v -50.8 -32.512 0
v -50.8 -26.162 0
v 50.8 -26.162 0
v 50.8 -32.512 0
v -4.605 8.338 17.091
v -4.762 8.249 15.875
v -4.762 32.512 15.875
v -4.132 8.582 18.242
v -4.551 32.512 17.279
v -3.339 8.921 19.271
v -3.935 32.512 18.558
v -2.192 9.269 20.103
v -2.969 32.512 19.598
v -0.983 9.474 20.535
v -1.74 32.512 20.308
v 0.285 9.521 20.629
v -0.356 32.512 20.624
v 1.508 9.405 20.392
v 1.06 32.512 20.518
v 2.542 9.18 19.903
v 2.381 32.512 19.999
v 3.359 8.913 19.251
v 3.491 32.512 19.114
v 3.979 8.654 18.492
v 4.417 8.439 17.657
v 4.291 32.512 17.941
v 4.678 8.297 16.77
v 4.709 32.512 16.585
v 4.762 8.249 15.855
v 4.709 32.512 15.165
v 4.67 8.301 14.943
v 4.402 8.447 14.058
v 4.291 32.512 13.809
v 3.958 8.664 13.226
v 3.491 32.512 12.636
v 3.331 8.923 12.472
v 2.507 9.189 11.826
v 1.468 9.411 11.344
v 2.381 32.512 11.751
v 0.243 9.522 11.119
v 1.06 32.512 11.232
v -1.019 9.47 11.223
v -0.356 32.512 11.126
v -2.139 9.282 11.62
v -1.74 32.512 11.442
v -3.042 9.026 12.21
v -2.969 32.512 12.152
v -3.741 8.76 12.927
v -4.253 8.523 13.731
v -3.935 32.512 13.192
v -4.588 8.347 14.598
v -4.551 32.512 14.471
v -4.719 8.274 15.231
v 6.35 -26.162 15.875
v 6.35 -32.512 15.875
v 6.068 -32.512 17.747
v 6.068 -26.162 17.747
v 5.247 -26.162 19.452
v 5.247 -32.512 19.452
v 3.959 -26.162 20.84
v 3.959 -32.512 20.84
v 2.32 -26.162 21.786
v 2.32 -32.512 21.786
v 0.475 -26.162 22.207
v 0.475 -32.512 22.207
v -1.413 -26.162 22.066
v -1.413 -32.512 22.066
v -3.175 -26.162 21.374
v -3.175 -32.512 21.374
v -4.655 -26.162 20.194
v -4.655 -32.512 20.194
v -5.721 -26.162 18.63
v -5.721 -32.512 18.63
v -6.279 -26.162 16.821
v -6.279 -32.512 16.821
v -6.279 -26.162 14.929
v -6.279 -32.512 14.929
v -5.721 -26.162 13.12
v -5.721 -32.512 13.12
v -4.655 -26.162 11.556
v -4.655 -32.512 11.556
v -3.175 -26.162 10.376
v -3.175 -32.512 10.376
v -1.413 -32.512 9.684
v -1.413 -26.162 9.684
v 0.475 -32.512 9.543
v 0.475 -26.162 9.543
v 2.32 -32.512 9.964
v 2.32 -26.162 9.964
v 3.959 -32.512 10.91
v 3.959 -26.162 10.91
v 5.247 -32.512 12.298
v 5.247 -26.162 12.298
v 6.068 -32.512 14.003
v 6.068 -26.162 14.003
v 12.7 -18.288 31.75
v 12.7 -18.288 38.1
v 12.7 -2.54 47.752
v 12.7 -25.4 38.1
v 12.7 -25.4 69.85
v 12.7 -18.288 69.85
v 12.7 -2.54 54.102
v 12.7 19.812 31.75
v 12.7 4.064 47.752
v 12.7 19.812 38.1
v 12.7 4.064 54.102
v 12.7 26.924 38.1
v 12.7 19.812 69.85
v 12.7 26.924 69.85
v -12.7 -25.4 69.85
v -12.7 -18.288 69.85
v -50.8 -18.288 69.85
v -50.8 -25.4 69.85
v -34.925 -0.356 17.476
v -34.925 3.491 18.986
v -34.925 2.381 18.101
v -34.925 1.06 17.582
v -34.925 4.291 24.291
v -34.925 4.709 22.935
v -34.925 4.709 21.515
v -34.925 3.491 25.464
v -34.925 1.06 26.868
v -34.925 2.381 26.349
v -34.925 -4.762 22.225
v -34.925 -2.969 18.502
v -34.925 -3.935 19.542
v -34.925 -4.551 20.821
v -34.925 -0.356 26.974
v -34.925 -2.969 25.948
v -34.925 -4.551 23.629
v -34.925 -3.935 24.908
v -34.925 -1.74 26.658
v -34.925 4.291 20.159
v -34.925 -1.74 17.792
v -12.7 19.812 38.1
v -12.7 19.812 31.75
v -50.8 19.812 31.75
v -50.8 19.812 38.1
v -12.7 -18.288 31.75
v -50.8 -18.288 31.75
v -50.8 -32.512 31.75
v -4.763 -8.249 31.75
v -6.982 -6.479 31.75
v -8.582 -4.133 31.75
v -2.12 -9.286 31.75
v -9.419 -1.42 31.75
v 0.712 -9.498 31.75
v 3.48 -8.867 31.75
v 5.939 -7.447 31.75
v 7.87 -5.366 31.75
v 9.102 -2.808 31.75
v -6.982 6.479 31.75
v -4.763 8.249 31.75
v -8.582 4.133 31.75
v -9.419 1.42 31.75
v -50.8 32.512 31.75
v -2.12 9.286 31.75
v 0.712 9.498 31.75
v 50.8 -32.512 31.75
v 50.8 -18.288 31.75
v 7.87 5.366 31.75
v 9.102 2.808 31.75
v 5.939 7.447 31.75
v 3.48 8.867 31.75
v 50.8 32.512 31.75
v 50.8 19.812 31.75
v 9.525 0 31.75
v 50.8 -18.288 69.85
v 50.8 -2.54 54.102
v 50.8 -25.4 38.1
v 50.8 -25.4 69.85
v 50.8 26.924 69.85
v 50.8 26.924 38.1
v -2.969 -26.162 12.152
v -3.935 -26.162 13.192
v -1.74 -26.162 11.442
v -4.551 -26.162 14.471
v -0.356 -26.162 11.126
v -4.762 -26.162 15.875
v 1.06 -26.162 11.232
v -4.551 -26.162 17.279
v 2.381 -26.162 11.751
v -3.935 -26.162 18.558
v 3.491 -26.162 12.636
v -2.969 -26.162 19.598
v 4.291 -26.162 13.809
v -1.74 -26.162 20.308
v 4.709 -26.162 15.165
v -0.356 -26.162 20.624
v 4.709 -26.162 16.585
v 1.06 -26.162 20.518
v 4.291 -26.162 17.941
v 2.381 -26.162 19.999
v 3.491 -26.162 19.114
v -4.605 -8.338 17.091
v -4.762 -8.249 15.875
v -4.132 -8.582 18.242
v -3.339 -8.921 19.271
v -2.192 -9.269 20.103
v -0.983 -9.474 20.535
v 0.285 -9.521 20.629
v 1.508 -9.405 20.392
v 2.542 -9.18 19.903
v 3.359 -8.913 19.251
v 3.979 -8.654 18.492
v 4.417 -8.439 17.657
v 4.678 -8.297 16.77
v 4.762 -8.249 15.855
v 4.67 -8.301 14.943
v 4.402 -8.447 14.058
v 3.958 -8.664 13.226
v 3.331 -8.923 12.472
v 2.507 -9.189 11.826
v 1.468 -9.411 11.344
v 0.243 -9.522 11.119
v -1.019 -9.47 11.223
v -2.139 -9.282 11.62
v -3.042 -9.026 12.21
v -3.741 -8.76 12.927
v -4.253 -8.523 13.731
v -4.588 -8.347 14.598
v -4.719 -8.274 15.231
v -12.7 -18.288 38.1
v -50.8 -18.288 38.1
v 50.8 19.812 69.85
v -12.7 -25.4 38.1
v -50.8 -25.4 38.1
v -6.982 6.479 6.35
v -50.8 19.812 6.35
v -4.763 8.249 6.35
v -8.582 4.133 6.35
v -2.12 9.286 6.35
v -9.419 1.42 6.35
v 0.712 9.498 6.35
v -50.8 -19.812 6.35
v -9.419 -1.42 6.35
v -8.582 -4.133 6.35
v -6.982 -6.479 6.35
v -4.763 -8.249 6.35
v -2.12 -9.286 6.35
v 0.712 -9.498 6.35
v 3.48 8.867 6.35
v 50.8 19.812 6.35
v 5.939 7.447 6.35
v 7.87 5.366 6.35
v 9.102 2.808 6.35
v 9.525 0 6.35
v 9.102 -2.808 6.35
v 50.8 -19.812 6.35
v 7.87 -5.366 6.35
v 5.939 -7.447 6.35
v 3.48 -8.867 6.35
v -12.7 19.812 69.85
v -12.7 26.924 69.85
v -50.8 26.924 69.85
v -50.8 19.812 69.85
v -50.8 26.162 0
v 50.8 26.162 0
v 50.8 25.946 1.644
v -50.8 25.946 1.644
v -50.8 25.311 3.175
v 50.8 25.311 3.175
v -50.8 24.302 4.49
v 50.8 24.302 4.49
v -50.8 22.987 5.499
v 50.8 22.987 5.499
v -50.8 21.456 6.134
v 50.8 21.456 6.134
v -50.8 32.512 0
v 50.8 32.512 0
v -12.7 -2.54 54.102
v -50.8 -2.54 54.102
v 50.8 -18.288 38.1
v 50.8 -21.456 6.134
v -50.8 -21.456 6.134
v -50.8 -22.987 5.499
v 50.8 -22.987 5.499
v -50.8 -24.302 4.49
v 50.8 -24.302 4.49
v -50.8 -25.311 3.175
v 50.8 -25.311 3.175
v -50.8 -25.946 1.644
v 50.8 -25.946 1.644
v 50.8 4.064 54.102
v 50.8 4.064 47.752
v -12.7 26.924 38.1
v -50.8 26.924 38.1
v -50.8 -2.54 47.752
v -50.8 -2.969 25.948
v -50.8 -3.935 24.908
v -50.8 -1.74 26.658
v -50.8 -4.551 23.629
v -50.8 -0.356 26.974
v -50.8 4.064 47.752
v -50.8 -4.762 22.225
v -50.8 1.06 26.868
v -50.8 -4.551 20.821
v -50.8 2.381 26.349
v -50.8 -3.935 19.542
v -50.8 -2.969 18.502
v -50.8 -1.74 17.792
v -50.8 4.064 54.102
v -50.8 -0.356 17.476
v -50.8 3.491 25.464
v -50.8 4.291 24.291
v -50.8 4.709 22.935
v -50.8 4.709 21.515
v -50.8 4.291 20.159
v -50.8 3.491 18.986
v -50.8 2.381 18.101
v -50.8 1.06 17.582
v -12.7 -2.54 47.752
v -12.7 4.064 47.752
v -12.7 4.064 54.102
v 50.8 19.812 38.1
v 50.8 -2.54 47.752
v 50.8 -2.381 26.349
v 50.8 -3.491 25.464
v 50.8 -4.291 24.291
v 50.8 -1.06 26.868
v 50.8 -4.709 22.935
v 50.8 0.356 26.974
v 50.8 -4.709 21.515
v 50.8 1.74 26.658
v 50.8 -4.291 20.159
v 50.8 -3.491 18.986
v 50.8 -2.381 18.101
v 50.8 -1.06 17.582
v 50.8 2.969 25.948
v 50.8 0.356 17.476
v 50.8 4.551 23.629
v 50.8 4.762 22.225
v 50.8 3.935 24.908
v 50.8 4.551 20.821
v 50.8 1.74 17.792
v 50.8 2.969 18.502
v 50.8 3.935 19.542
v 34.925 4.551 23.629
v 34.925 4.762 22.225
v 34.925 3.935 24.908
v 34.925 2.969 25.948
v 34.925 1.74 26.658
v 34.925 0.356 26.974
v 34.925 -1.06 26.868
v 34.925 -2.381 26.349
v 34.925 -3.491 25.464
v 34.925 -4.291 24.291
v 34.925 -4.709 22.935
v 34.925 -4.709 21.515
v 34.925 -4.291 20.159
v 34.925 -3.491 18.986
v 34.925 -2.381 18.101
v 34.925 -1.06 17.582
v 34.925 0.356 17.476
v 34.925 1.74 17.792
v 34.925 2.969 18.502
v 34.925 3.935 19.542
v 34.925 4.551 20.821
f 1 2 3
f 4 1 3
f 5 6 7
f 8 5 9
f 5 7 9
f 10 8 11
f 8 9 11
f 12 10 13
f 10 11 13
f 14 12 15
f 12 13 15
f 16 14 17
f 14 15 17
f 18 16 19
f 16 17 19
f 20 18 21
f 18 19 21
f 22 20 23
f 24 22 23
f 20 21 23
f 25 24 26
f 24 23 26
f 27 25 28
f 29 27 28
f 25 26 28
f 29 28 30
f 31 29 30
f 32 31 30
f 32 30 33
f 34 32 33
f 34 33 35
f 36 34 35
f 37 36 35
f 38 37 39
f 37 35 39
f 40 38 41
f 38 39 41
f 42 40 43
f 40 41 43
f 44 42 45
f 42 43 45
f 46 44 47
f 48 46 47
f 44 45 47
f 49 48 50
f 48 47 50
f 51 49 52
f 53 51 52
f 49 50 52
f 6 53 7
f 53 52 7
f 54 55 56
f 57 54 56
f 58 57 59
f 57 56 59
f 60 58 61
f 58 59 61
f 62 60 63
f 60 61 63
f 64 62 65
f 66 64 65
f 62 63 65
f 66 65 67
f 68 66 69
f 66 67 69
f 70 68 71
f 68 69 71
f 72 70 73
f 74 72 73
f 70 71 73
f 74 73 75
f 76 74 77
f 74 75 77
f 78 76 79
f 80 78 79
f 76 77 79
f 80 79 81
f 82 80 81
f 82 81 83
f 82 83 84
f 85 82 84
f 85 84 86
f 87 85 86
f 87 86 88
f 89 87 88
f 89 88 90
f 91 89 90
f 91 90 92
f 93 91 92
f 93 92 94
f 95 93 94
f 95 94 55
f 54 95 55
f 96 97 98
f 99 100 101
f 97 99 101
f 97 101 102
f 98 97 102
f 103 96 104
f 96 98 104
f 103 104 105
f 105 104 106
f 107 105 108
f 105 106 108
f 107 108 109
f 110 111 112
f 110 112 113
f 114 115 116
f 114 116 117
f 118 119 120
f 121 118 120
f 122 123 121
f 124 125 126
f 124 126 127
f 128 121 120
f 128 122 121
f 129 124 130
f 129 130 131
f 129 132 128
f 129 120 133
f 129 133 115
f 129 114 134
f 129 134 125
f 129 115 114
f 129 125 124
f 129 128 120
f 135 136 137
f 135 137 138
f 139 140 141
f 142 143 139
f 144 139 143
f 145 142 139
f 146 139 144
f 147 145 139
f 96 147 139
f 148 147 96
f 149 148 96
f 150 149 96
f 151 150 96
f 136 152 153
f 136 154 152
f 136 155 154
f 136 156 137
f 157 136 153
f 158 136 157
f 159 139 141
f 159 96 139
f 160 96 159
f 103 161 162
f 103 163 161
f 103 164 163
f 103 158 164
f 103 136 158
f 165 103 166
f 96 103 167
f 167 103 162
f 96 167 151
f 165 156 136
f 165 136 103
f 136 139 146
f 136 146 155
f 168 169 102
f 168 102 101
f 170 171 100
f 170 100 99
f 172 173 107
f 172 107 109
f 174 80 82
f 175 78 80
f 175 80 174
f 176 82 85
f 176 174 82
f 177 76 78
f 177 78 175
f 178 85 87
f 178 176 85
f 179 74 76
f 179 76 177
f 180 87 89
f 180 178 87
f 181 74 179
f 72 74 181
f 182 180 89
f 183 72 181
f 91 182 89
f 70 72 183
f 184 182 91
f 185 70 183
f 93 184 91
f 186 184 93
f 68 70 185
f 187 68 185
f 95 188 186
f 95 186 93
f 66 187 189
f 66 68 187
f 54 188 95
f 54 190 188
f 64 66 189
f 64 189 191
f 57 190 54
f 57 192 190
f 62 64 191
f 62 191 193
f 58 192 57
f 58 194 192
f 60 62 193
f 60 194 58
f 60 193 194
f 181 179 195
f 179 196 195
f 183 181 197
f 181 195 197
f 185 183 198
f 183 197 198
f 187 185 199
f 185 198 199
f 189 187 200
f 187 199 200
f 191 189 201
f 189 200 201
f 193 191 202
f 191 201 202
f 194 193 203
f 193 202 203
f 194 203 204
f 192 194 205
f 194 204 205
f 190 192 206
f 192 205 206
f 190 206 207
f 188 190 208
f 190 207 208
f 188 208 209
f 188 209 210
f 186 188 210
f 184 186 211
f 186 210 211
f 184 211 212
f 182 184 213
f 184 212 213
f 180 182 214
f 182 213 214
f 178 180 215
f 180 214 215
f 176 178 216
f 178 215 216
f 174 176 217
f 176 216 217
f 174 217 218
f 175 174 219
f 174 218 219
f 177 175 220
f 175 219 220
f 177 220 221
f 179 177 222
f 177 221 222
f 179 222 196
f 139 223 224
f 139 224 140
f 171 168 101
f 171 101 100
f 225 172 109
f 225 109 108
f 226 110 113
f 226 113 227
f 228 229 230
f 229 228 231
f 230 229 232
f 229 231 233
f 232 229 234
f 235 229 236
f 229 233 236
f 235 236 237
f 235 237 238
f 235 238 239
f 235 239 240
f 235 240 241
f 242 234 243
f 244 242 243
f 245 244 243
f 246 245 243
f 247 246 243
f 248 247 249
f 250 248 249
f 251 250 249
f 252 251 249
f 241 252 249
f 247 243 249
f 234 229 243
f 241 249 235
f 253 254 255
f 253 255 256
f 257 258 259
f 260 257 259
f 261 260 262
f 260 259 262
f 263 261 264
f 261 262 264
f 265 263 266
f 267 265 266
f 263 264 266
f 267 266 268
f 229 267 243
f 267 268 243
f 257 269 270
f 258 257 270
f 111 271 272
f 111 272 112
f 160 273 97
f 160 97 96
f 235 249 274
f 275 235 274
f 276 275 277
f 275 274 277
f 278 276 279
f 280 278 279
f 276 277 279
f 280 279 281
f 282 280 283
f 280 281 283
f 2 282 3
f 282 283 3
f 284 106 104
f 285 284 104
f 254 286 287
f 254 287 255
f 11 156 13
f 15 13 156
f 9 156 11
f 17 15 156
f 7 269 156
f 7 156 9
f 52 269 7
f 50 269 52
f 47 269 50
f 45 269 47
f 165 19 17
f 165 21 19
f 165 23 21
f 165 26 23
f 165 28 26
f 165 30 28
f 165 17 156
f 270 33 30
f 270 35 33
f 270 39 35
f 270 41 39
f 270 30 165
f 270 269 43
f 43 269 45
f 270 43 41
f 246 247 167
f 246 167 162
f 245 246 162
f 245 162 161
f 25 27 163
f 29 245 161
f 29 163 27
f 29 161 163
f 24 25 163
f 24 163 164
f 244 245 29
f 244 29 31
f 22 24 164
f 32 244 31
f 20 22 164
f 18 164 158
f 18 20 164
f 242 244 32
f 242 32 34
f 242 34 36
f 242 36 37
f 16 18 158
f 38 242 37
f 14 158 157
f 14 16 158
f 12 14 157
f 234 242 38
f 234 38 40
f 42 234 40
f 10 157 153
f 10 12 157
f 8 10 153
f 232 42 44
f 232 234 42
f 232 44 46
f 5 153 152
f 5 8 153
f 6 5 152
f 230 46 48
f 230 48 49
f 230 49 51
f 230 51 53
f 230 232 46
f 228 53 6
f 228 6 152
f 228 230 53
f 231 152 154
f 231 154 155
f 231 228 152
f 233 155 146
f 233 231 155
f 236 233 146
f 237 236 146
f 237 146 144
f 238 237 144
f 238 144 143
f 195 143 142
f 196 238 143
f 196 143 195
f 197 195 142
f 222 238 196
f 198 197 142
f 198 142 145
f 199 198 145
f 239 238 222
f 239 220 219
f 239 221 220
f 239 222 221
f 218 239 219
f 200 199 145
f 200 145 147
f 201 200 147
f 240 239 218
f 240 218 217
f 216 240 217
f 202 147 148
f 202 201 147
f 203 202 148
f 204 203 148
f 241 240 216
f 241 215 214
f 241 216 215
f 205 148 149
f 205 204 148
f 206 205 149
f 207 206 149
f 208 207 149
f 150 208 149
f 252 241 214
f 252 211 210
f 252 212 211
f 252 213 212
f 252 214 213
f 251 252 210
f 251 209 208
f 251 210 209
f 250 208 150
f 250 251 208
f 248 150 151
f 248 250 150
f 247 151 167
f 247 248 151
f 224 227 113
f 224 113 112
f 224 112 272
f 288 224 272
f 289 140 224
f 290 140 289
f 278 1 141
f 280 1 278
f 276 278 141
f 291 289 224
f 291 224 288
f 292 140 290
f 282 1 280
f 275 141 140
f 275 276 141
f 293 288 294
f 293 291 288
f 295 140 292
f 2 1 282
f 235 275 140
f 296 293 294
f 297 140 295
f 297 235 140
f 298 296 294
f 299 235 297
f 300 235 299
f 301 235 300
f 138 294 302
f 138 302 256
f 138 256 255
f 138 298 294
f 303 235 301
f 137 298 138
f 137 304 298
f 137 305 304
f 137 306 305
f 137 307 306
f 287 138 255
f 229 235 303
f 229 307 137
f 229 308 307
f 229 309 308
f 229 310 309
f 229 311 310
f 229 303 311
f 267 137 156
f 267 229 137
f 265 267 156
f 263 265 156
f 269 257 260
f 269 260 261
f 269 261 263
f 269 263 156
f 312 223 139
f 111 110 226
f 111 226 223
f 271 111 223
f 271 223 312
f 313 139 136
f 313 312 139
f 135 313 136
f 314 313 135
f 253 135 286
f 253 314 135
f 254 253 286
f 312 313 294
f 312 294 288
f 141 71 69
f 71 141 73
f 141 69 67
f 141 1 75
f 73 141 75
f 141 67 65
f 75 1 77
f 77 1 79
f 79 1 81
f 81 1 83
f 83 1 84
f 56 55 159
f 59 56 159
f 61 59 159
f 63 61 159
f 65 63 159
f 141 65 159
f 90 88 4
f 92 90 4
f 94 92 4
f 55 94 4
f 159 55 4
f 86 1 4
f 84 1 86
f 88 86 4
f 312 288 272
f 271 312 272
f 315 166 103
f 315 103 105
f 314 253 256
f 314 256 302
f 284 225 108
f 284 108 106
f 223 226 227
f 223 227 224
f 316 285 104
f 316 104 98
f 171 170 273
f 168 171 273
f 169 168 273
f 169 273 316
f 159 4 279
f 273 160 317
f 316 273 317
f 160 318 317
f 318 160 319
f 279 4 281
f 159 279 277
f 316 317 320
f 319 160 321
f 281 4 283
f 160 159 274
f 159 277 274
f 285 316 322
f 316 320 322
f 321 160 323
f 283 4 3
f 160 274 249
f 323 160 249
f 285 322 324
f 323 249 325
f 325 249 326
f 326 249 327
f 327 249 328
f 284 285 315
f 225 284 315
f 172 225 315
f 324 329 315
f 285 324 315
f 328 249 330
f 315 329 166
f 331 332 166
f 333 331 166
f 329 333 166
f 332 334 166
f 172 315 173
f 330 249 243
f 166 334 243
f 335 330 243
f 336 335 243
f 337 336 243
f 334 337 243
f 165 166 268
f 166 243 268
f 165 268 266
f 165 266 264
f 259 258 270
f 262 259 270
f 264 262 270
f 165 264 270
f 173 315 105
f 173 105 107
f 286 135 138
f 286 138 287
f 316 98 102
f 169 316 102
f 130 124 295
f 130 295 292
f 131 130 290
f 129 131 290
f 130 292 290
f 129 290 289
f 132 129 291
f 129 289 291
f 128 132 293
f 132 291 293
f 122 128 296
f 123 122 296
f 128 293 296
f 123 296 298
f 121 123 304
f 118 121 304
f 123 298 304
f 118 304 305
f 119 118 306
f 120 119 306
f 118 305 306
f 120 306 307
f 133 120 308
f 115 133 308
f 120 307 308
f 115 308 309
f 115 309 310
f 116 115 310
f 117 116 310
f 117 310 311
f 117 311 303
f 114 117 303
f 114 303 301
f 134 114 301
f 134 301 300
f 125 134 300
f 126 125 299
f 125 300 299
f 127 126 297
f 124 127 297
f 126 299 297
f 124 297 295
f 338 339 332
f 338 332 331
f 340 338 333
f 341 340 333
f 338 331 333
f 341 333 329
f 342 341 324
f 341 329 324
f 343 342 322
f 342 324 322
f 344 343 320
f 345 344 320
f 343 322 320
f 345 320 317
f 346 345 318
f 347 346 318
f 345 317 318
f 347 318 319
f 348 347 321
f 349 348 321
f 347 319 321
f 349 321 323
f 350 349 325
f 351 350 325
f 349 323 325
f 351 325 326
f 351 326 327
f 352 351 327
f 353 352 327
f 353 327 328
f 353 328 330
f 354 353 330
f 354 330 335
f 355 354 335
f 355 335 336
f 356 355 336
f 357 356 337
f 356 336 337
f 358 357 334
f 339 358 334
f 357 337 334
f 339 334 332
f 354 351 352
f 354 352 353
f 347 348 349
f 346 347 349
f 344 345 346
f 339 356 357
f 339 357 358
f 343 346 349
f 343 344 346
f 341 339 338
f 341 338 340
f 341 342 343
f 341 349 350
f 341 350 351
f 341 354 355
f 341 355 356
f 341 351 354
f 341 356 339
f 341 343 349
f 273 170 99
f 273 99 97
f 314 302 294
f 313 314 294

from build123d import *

# Parameters (mm, degrees)
F0_W            = 101.6
F0_H            = 65.024
F0_R            = 9.525
F1_DEPTH        = 31.75
F3_DEPTH        = 101.601
F5_START        = -63.5
F5_DEPTH        = 38.1
F6_DEPTH        = 38.1
F7_R            = 4.7625
F8_DEPTH        = 15.875
F9_R            = 4.7625
F10_DEPTH       = 15.875
F12_D           = 9.525
F12_CBORE_D     = 12.7
F12_CBORE_DEPTH = 6.35


with BuildPart() as f1:
    # F0 (on Top) → F1 (new body)
    with BuildSketch(Plane.XY):
        Rectangle(F0_W, F0_H)
        Circle(F0_R, mode=Mode.SUBTRACT)
    extrude(amount=F1_DEPTH)

    # F2 (on face) → F3 (cut, through all)
    with BuildSketch(Plane.YZ.offset(50.8)):
        with BuildLine():
            Line((19.812, 6.35), (-19.812, 6.35))
            ThreePointArc((-19.812, 6.35), (-24.3021280605, 4.4901280605), (-26.162, 0))
            Line((-26.162, 0), (26.162, 0))
            ThreePointArc((26.162, 0), (24.3021280605, 4.4901280605), (19.812, 6.35))
        make_face()
    extrude(amount=-F3_DEPTH, mode=Mode.SUBTRACT)

    # F4 (on face) → F5 (join)
    with BuildSketch(Plane.YZ.offset(50.8).offset(F5_START)):
        Polygon((-18.288, 38.1), (-18.288, 31.75), (19.812, 31.75), (19.812, 38.1), (26.924, 38.1), (26.924, 69.85), (19.812, 69.85), (4.064, 54.102), (4.064, 47.752), (-2.54, 47.752), (-2.54, 54.102), (-18.288, 69.85), (-25.4, 69.85), (-25.4, 38.1), align=None)
    extrude(amount=-F5_DEPTH)

    # F4 (on face) → F6 (join)
    with BuildSketch(Plane.YZ.offset(50.8)):
        Polygon((-18.288, 38.1), (-18.288, 31.75), (19.812, 31.75), (19.812, 38.1), (26.924, 38.1), (26.924, 69.85), (19.812, 69.85), (4.064, 54.102), (4.064, 47.752), (-2.54, 47.752), (-2.54, 54.102), (-18.288, 69.85), (-25.4, 69.85), (-25.4, 38.1), align=None)
    extrude(amount=-F6_DEPTH)

    # F7 (on face) → F8 (cut)
    with BuildSketch(Plane.YZ.offset(50.8)):
        with Locations((0, 22.225)):
            Circle(F7_R)
    extrude(amount=-F8_DEPTH, mode=Mode.SUBTRACT)

    # F9 (on face) → F10 (cut)
    with BuildSketch(Plane(origin=(-50.8, 0, 0), x_dir=(0, -1, 0), z_dir=(-1, 0, 0))):
        with Locations((0, 22.225)):
            Circle(F9_R)
    extrude(amount=-F10_DEPTH, mode=Mode.SUBTRACT)

    # F12 (through all)
    with Locations(Plane.XZ.offset(32.512)):
        with Locations((0, 15.875)):
            CounterBoreHole(F12_D / 2, F12_CBORE_D / 2, F12_CBORE_DEPTH)


solid = f1.part
